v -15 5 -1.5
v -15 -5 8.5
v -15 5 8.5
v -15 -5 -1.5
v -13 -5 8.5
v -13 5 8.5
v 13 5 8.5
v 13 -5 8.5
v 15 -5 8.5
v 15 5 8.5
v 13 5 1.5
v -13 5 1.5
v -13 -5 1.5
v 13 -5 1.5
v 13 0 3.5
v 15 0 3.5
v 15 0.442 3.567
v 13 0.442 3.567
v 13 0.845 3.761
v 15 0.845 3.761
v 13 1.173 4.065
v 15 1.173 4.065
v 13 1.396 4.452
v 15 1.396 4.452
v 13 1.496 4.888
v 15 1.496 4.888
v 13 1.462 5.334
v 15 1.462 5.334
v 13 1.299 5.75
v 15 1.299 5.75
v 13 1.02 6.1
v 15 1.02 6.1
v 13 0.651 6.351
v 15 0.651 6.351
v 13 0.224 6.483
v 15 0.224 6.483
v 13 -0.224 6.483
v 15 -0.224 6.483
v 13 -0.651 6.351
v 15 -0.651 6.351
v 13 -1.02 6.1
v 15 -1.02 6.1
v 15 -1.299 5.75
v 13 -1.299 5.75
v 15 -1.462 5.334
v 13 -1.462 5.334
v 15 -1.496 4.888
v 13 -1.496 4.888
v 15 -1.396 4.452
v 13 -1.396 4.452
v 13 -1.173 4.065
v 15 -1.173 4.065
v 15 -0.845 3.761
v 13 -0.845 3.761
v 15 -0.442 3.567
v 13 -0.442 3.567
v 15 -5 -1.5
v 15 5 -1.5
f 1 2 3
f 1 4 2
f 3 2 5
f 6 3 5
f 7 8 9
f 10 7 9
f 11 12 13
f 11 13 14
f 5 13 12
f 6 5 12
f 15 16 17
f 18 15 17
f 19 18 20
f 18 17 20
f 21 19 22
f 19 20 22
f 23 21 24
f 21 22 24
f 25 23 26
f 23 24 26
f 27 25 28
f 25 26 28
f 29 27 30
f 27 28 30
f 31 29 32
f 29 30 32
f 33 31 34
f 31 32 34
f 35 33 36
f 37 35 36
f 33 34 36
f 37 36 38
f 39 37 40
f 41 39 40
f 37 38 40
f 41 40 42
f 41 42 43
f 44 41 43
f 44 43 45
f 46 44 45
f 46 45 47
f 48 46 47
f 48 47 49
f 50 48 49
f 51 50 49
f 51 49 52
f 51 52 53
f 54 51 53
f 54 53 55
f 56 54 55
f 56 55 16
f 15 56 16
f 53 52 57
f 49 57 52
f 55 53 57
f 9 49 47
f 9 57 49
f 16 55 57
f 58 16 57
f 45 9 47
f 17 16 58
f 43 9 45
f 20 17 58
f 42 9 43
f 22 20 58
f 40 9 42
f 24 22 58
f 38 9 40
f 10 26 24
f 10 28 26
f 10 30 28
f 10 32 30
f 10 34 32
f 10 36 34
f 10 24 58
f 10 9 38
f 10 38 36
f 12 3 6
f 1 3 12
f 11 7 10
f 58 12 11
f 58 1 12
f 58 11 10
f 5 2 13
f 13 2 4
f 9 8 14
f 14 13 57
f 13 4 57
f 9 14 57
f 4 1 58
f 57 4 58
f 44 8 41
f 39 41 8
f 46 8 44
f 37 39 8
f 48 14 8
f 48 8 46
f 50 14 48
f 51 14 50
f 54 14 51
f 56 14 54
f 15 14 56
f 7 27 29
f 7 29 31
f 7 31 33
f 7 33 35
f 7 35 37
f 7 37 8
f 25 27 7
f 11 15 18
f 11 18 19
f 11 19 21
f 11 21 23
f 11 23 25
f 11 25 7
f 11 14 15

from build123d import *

# Parameters (mm, degrees)
SKETCH_1_W          = 30
SKETCH_1_H          = 10
EXTRUDE_1_DEPTH     = 1.5
SKETCH_2_W          = 2
SKETCH_2_H          = 10
EXTRUDE_2_DEPTH     = 7
CUT_EXTRUDE_1_REACH = 33.579
SKETCH_3_R          = 1.5


with BuildPart() as part:
    # 草图1 → 凸台-拉伸1 (new, symmetric)
    with BuildSketch(Plane.XY):
        Rectangle(SKETCH_1_W, SKETCH_1_H)
    extrude(amount=EXTRUDE_1_DEPTH, both=True)

    # 草图2 → 凸台-拉伸2 (add)
    with BuildSketch(Plane.XY.offset(1.5)):
        with Locations((-14, 0)):
            Rectangle(SKETCH_2_W, SKETCH_2_H)
        with Locations((14, 0)):
            Rectangle(SKETCH_2_W, SKETCH_2_H)
    extrude(amount=EXTRUDE_2_DEPTH)

    # 草图3 → 切除-拉伸1 (cut, up to next)
    with BuildSketch(Plane(origin=(15, 0, 0), x_dir=(0, 0, -1), z_dir=(1, 0, 0)), mode=Mode.PRIVATE) as cut_extrude_1_sk1:
        with Locations((-5, 0)):
            Circle(SKETCH_3_R)
    cut_extrude_1_tool1 = extrude(cut_extrude_1_sk1.sketch, amount=-CUT_EXTRUDE_1_REACH, mode=Mode.PRIVATE) & part.part
    add(cut_extrude_1_tool1.solids().sort_by_distance((15, 0, 5))[0], mode=Mode.SUBTRACT)


solid = part.part
